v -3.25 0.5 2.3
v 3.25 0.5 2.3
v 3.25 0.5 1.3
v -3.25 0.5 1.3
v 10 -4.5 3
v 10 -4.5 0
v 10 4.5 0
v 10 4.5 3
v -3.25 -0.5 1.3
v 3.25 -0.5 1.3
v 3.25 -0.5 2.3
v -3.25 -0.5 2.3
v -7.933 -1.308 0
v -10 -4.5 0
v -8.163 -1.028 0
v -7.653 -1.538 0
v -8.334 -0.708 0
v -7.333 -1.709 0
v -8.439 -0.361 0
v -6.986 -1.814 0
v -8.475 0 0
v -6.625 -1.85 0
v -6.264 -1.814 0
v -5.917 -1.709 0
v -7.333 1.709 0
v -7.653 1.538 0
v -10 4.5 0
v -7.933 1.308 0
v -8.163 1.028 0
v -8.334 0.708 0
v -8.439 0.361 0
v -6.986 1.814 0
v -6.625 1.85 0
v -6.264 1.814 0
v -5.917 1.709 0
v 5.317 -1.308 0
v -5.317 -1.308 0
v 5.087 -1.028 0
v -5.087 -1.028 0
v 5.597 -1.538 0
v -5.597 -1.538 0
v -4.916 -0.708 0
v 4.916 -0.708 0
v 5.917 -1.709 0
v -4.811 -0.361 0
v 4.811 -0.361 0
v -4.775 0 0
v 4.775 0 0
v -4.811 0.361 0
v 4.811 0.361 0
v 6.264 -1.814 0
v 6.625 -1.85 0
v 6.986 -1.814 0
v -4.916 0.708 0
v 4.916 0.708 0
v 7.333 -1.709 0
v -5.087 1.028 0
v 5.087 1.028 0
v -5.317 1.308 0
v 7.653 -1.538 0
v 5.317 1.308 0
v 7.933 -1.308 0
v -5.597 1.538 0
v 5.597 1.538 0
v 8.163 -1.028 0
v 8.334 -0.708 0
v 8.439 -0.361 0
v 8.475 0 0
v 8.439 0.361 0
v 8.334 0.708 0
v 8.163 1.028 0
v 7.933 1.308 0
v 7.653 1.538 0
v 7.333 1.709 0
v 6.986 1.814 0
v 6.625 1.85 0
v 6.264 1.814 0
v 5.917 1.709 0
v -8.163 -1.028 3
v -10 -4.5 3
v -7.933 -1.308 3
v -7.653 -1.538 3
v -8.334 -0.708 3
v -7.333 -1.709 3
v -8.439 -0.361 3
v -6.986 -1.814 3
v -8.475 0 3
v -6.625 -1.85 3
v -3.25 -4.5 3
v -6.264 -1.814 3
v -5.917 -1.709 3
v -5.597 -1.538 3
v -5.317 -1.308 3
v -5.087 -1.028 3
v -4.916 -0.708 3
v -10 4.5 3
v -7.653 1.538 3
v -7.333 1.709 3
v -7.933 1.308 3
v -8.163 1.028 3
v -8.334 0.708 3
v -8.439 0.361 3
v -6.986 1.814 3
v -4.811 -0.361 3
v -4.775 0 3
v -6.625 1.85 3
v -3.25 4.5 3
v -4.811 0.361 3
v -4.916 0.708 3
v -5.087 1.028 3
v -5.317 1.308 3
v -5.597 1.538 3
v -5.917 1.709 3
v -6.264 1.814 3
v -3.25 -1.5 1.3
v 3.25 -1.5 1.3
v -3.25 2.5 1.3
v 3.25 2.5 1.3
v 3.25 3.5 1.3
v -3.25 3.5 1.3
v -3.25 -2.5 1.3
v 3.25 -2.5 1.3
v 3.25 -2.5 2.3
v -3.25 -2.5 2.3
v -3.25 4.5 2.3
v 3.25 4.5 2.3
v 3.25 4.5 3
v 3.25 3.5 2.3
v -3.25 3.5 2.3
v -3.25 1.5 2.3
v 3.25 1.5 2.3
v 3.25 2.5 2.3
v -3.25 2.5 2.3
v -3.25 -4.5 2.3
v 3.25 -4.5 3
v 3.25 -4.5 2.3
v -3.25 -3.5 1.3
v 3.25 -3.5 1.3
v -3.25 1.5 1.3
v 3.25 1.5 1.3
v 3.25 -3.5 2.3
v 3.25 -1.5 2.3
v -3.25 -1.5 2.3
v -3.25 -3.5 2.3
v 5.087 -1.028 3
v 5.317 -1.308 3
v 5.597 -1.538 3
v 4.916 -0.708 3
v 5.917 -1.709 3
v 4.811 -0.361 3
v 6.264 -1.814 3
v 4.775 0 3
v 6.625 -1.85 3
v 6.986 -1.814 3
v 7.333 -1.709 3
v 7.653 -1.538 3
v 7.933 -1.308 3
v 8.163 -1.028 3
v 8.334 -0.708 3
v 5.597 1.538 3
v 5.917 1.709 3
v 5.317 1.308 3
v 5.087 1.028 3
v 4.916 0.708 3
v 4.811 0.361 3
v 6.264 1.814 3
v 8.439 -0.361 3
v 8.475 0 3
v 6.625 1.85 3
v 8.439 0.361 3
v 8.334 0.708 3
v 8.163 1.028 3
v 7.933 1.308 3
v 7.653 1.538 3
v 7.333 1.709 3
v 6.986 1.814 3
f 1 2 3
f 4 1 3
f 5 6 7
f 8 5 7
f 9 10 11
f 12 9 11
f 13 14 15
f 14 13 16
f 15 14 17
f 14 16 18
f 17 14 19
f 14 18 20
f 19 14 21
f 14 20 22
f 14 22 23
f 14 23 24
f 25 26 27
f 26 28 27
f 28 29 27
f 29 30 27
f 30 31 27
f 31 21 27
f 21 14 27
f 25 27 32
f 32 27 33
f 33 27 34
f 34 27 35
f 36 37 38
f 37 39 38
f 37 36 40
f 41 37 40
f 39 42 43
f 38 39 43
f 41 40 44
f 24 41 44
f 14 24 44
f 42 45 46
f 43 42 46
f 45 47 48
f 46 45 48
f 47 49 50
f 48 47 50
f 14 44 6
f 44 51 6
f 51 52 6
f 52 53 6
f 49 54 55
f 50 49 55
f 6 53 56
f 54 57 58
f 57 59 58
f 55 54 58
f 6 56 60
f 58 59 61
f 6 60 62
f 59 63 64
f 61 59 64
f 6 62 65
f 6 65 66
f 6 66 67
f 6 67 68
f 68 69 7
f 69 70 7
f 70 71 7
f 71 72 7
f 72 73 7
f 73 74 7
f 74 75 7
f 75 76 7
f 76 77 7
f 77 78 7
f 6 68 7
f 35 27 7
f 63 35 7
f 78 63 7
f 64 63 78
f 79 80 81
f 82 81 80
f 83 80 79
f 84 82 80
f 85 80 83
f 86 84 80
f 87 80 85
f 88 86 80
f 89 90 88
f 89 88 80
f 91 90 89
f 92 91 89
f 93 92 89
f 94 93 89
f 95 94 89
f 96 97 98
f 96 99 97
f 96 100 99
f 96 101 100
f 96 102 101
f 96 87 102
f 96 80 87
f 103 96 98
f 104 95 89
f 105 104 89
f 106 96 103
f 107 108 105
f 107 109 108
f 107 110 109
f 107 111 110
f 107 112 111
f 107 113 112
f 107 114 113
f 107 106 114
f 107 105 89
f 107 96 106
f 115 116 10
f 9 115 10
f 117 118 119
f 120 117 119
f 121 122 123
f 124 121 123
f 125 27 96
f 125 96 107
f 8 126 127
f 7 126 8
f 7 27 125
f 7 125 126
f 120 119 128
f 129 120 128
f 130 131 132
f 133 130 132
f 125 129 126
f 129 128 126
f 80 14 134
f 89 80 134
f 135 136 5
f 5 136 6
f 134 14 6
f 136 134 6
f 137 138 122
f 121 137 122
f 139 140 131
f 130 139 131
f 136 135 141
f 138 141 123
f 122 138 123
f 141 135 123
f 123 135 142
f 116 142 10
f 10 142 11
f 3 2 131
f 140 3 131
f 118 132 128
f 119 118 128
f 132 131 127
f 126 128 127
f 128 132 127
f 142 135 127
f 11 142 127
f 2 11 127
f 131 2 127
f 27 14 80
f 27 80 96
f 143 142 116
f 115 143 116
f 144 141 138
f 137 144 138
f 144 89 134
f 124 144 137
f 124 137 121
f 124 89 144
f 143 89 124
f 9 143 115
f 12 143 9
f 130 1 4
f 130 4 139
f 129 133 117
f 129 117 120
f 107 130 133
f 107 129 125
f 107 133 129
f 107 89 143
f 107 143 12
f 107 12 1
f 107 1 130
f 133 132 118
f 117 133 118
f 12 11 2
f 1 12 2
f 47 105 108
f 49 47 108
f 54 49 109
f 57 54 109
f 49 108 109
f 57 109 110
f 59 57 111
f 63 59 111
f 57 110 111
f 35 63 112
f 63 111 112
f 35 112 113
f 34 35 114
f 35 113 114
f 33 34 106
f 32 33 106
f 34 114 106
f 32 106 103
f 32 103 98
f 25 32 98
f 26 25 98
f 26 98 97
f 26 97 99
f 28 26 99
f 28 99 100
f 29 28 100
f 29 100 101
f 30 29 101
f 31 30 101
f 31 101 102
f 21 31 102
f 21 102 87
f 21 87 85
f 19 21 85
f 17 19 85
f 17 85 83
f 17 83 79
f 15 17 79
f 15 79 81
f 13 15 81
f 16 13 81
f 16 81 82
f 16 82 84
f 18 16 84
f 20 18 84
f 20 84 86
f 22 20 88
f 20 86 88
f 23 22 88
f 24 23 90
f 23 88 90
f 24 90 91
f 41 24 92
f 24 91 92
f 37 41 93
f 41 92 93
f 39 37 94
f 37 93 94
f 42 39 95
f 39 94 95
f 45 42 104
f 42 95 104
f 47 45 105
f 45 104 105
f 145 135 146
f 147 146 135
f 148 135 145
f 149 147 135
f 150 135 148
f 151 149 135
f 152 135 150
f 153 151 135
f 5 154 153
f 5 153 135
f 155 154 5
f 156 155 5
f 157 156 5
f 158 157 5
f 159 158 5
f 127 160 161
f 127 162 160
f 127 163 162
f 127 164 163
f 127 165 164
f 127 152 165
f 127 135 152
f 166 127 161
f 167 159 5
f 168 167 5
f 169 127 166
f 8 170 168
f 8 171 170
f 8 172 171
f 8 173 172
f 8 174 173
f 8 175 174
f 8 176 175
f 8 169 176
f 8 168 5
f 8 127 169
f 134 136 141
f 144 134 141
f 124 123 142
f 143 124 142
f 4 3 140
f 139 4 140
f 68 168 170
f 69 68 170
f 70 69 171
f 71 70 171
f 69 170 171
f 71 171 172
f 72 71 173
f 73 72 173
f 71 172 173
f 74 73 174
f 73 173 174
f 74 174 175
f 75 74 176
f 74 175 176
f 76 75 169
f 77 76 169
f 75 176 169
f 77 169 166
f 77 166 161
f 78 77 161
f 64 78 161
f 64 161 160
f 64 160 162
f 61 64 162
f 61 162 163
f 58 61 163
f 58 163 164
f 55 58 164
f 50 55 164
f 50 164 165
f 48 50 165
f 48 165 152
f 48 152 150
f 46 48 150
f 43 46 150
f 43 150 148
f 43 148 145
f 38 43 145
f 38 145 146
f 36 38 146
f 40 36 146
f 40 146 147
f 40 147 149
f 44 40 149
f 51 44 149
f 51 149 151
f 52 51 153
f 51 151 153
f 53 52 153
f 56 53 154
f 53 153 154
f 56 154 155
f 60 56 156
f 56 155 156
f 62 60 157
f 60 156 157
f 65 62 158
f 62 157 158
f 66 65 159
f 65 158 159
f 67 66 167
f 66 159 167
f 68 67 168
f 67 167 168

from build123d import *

# Parameters (mm, degrees)
F0_W     = 20
F0_H     = 9
F1_DEPTH = 3
F3_DEPTH = 3.25
F4_R     = 1.85
F5_DEPTH = 25


with BuildPart() as f1:
    # F0 (on Top) → F1 (new body)
    with BuildSketch(Plane.XY):
        Rectangle(F0_W, F0_H)
    extrude(amount=F1_DEPTH)

    # F2 (on Right) → F3 (cut, symmetric)
    with BuildSketch(Plane.YZ):
        Polygon((4.5, 3), (0, 3), (-4.5, 3), (-4.5, 2.3), (-3.5, 2.3), (-3.5, 1.3), (-2.5, 1.3), (-2.5, 2.3), (-1.5, 2.3), (-1.5, 1.3), (-0.5, 1.3), (-0.5, 2.3), (0, 2.3), (0.5, 2.3), (0.5, 1.3), (1.5, 1.3), (1.5, 2.3), (2.5, 2.3), (2.5, 1.3), (3.5, 1.3), (3.5, 2.3), (4.5, 2.3), align=None)
    extrude(amount=F3_DEPTH, both=True, mode=Mode.SUBTRACT)

    # F4 (on face) → F5 (cut)
    with BuildSketch(Plane.XY.offset(3)):
        with Locations((-6.625, 0)):
            Circle(F4_R)
        with Locations((6.625, 0)):
            Circle(F4_R)
    extrude(amount=-F5_DEPTH, mode=Mode.SUBTRACT)


solid = f1.part
